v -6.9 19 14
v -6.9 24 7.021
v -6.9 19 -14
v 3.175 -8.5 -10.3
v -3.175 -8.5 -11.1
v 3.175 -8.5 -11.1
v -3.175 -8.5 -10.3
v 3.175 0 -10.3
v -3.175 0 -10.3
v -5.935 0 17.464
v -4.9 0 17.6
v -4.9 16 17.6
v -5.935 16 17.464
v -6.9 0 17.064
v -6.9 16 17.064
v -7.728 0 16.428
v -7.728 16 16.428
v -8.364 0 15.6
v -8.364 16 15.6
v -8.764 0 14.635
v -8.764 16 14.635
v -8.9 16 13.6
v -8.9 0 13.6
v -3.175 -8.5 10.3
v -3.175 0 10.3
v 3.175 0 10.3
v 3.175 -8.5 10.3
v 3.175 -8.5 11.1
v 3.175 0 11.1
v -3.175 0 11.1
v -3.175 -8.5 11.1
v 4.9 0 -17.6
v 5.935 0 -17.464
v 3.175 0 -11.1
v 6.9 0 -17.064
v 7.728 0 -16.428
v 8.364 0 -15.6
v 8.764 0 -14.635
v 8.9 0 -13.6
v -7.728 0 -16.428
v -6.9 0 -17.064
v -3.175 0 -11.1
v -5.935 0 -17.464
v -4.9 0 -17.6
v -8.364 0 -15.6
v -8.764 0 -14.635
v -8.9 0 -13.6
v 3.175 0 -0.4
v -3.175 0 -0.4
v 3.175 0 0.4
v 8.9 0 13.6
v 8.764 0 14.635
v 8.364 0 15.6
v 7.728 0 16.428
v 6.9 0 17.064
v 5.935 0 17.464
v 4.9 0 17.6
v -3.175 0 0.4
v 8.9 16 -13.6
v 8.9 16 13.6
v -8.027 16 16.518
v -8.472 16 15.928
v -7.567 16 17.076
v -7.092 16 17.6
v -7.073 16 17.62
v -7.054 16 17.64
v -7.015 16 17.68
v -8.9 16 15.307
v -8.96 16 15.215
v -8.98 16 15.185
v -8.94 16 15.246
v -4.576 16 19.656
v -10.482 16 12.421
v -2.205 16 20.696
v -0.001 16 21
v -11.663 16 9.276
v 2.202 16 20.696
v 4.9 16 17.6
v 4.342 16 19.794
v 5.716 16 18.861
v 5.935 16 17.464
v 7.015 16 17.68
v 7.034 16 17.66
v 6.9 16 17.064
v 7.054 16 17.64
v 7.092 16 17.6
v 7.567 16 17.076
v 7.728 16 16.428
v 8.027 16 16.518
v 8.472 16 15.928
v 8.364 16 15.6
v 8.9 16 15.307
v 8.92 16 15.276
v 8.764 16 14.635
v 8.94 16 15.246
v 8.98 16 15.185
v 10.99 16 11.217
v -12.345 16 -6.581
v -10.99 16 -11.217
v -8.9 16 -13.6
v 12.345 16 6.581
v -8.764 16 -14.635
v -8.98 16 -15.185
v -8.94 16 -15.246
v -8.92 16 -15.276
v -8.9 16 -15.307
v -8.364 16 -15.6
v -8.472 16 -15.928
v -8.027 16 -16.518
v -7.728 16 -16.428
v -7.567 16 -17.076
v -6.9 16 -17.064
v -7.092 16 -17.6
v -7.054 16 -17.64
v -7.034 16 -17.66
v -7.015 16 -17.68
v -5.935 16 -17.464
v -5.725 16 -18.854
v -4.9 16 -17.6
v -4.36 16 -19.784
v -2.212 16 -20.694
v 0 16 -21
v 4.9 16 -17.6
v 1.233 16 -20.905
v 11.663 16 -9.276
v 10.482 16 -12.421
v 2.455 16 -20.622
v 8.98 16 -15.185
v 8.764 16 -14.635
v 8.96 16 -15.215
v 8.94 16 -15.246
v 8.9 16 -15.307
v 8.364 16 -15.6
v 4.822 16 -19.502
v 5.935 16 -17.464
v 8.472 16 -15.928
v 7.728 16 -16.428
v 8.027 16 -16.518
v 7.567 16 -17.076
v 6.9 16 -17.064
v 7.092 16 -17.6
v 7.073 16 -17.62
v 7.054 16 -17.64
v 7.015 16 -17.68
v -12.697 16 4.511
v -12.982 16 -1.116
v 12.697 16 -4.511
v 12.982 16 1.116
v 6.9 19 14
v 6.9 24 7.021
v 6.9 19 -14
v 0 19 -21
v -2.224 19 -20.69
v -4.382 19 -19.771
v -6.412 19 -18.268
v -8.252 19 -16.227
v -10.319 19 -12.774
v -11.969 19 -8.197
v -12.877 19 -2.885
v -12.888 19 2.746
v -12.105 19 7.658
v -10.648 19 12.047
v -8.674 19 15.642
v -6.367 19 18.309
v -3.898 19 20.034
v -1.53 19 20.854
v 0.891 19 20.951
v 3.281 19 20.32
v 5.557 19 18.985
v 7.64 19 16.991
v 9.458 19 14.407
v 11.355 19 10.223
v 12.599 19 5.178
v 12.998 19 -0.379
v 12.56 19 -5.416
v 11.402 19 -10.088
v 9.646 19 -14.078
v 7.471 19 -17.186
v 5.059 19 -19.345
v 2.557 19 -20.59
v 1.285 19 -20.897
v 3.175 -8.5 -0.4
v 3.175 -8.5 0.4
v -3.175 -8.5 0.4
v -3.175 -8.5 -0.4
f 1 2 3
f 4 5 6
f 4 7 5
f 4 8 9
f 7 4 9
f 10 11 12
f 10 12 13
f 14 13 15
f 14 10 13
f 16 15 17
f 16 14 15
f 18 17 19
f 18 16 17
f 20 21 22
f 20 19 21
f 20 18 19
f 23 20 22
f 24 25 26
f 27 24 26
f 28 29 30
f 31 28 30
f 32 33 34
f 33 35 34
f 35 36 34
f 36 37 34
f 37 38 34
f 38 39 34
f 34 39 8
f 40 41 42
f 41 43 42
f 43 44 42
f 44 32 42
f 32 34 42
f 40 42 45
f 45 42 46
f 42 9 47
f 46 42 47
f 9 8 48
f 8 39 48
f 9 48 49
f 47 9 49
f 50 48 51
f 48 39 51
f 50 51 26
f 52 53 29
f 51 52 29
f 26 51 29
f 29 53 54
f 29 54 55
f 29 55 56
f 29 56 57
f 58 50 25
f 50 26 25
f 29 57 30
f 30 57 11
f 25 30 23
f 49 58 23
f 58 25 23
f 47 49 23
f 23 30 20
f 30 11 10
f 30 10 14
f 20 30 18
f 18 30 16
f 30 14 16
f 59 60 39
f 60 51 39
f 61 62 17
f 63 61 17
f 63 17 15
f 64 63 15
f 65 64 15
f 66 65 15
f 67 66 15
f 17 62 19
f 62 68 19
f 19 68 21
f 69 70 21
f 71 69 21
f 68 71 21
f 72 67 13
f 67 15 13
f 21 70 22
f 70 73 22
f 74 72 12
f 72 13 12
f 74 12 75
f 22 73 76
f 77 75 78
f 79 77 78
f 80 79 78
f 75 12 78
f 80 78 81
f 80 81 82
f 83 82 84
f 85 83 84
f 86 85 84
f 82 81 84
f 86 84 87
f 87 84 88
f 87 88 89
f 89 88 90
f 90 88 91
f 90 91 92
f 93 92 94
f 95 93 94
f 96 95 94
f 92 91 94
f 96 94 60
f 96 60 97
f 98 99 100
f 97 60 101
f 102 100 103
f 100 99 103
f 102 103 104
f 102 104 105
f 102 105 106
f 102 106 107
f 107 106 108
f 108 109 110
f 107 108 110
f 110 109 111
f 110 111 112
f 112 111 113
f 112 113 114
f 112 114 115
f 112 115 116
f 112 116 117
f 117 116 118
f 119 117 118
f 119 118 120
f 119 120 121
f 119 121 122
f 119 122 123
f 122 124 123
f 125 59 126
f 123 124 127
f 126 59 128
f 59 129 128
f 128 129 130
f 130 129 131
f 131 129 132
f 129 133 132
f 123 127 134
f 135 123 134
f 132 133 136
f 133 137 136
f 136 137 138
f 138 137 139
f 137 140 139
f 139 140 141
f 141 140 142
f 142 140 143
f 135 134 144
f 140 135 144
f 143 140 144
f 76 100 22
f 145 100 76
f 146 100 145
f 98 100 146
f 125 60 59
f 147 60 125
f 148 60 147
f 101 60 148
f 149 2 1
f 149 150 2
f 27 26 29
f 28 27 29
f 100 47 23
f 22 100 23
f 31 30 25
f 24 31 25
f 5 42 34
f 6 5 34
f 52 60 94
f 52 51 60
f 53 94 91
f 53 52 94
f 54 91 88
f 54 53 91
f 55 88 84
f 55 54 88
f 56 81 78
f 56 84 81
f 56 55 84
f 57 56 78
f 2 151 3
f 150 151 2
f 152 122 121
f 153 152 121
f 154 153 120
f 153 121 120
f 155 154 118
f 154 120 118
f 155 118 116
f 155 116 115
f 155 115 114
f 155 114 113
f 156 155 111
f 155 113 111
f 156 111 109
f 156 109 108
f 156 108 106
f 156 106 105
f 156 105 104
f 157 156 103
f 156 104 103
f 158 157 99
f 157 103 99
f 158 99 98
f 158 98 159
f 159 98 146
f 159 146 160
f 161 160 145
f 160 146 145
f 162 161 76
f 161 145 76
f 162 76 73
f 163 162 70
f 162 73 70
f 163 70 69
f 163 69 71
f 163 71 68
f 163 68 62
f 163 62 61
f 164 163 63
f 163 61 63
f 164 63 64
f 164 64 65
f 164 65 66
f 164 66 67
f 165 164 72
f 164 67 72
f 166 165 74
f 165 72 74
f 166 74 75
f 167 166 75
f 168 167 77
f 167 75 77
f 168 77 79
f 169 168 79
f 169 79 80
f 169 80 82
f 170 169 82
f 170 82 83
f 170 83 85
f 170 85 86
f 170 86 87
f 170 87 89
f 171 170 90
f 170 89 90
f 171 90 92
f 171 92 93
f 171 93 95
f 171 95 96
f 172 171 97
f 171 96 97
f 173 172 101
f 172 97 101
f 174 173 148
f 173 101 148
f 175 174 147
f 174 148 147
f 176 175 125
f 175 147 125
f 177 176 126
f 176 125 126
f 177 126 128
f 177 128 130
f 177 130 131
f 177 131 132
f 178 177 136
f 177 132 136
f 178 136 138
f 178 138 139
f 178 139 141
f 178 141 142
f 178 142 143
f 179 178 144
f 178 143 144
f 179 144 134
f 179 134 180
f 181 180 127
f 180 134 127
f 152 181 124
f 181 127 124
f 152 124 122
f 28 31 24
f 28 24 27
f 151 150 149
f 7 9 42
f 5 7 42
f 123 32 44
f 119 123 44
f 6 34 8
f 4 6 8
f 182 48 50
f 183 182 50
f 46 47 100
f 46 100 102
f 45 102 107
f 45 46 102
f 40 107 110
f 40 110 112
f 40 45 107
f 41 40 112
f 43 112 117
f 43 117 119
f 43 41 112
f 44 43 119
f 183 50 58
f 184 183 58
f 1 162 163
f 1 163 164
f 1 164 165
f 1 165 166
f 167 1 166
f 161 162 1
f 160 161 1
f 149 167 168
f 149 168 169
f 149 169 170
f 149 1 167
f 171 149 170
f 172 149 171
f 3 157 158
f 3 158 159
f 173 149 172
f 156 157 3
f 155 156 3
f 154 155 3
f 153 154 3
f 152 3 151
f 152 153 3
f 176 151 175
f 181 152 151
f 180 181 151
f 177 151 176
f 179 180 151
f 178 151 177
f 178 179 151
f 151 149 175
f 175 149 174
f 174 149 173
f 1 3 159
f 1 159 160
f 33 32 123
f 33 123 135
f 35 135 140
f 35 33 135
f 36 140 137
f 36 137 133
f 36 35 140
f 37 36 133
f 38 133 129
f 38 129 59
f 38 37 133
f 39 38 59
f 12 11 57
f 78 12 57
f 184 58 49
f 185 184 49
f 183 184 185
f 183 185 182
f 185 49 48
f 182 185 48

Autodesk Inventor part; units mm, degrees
ref_plane "YZ Plane" through (0, 0, 0) normal (1, 0, 0) x (0, 1, 0)
ref_plane "XZ Plane" through (0, 0, 0) normal (0, 1, 0) x (-1, 0, 0)
sketch "Sketch1" plane through (0, 0, 0) normal (0, 1, 0) x (-1, 0, 0)
  line L0 (8.9, 17.6) -> (-8.9, 17.6)
  line L1 (-8.9, 17.6) -> (-8.9, -17.6)
  line L2 (-8.9, -17.6) -> (8.9, -17.6)
  line L3 (8.9, -17.6) -> (8.9, 17.6)
  point P0 (0, 0)
  point P1 (8.9, 0)
  point P2 (0, -17.6)
  dimension "d0" = 35.2
  dimension "d1" = 17.8
extrude "Extrusion1" add sketch "Sketch1" along normal blind 16
sketch "Sketch2" plane through (0, 16, 0) normal (0, 1, 0) x (1, 0, 0)
  ellipse E0 centre (0, 0) end of major axis (0, 21) minor radius 13
  dimension "d4" = 21
  dimension "d5" = 13
extrude "Extrusion2" add sketch "Sketch2" along normal blind 3
fillet "Fillet1" radius 4 4 edges at (8.9, 8, 17.6) (8.9, 8, -17.6) (-8.9, 8, 17.6) (-8.9, 8, -17.6)
ref_plane "Work Plane1" through (6.9, 0, 13.6) normal (1, 0, 0) x (0, 0, -1)
sketch "Sketch3" plane through (6.9, 0, 13.6) normal (1, 0, 0) x (0, 0, -1)
  line L0 (34.6, 19) -> (-7.4, 19) projected
  line L1 (27.6, 19) -> (6.5786, 24)
  line L2 (6.5786, 24) -> (-0.4, 19)
  line L3 (-0.4, 19) -> (27.6, 19)
  point P0 (13.6, 0)
  dimension "d10" = 7
  dimension "d11" = 7
  dimension "d12" = 5
  dimension "d13" = 131
extrude "Extrusion3" add sketch "Sketch3" against normal blind 13.8
sketch "Sketch4" plane through (0, 0, 0) normal (0, -1, 0) x (1, 0, 0)
  line L0 (3.175, 11.1) -> (-3.175, 11.1)
  line L1 (-3.175, 11.1) -> (-3.175, 10.3)
  line L2 (-3.175, 10.3) -> (3.175, 10.3)
  line L3 (3.175, 10.3) -> (3.175, 11.1)
  line L4 (3.175, 0.4) -> (-3.175, 0.4)
  line L5 (-3.175, 0.4) -> (-3.175, -0.4)
  line L6 (-3.175, -0.4) -> (3.175, -0.4)
  line L7 (3.175, -0.4) -> (3.175, 0.4)
  line L8 (3.175, -10.3) -> (-3.175, -10.3)
  line L9 (-3.175, -10.3) -> (-3.175, -11.1)
  line L10 (-3.175, -11.1) -> (3.175, -11.1)
  line L11 (3.175, -11.1) -> (3.175, -10.3)
  line L12 (0, 10.3) -> (0, 0.4)
  line L13 (0, -0.4) -> (0, -10.3)
  line L14 (0, -11.1) -> (0, -21)
  ellipse E0 centre (0, 0) end of major axis (0, 21) minor radius 13 projected
  line L15 (0, 11.1) -> (0, 21)
  point P0 (3.175, 0)
  dimension "d16" = 0.8
  dimension "d17" = 6.35
extrude "Extrusion4" add sketch "Sketch4" along normal blind 8.5 contours L3 L2 L1 L0 | L4 L7 L6 L5 | L10 L9 L8 L11
properties part number "SwitchRocker"
